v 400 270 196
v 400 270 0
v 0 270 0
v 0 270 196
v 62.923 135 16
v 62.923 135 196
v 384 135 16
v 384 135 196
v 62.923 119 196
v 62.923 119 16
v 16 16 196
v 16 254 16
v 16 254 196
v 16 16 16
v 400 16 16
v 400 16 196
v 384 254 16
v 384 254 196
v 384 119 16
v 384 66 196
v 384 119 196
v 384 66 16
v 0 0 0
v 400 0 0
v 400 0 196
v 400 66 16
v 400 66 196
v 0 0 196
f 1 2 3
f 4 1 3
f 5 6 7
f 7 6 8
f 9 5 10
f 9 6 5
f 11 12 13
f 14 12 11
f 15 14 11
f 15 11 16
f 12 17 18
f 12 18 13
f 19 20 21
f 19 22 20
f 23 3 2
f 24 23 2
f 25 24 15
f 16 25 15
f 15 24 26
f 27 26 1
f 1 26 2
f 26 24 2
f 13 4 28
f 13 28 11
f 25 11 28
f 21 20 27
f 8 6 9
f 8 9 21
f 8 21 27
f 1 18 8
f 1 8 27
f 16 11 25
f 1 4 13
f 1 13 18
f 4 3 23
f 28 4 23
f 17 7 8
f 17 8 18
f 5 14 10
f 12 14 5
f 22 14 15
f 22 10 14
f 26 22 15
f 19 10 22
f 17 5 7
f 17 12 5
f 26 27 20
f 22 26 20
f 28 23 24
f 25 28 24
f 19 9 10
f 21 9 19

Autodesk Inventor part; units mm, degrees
ref_plane "YZ Plane" through (0, 0, 0) normal (1, 0, 0) x (0, 1, 0)
ref_plane "XZ Plane" through (0, 0, 0) normal (0, 1, 0) x (-1, 0, 0)
ref_plane "XY Plane" through (0, 0, 0) normal (0, 0, 1) x (1, 0, 0)
sketch "Sketch1" plane through (0, 0, 0) normal (0, 0, 1) x (1, 0, 0)
  line L0 (0, 0) -> (400, 0)
  line L1 (400, 0) -> (400, 270)
  line L2 (400, 270) -> (0, 270)
  line L3 (0, 270) -> (0, 0)
  dimension "d0" = 400
  dimension "d1" = 270
extrude "Extrusion1" add sketch "Sketch1" along normal blind 16
sketch "Sketch2" plane through (0, 0, 16) normal (0, 0, 1) x (1, 0, 0)
  line L0 (0, 0) -> (400, 0) projected
  line L1 (400, 0) -> (400, 270) projected
  line L2 (400, 270) -> (0, 270) projected
  line L3 (0, 270) -> (0, 0) projected
  line L4 (16, 16) -> (384, 16)
  line L5 (384, 16) -> (384, 254)
  line L6 (384, 254) -> (16, 254)
  line L7 (16, 254) -> (16, 16)
  dimension "d4" = 16
  dimension "d5" = 16
  dimension "d6" = 16
  dimension "d7" = 16
extrude "Extrusion2" add sketch "Sketch2" along normal blind 180
sketch "Sketch3" plane through (0, 0, 196) normal (0, 0, 1) x (1, 0, 0)
  line L0 (16, 254) -> (16, 16) projected
  line L1 (16, 16) -> (384, 16) projected
  line L2 (384, 16) -> (384, 254) projected
  line L3 (384, 254) -> (16, 254) projected
  line L4 (384, 254) -> (384, 16) projected
  line L5 (400, 0) -> (400, 270) projected
  line L6 (384, 16) -> (400, 16)
  line L7 (400, 16) -> (400, 66)
  line L8 (400, 66) -> (384, 66)
  line L9 (384, 66) -> (384, 16)
  point P0 (0, 0)
  dimension "d10" = 50
extrude "Extrusion3" cut sketch "Sketch3" against normal blind 180 contours L2 L8 L5 L6
sketch "Sketch4" plane through (0, 0, 196) normal (0, 0, 1) x (1, 0, 0)
  line L0 (16, 254) -> (16, 16) projected
  line L1 (400, 16) -> (16, 16) projected
  line L2 (400, 66) -> (400, 16) projected
  line L3 (384, 66) -> (400, 66) projected
  line L4 (384, 66) -> (384, 254) projected
  line L5 (384, 254) -> (16, 254) projected
  line L6 (384, 66) -> (400, 66) projected
  line L7 (400, 66) -> (400, 270) projected
  line L8 (400, 270) -> (0, 270) projected
  line L9 (0, 270) -> (0, 0) projected
  line L10 (0, 0) -> (400, 0) projected
  line L11 (400, 0) -> (400, 16) projected
  line L12 (400, 16) -> (16, 16) projected
  line L13 (16, 16) -> (16, 254) projected
  line L14 (16, 254) -> (384, 254) projected
  line L15 (384, 254) -> (384, 66) projected
  line L16 (384, 254) -> (384, 66) projected
  line L17 (384, 254) -> (62.9229, 254)
  line L18 (62.9229, 254) -> (62.9229, 119)
  line L19 (62.9229, 119) -> (384, 119)
  line L20 (384, 119) -> (384, 254)
  line L21 (384, 254) -> (16, 254) projected
  line L22 (384, 254) -> (62.9229, 254)
  line L23 (62.9229, 254) -> (62.9229, 135)
  line L24 (62.9229, 135) -> (384, 135)
  line L25 (384, 135) -> (384, 254)
  dimension "d13" = 135
  dimension "d14" = 16
extrude "Extrusion4" add sketch "Sketch4" against normal blind 180 contours L24 L4 L19 L18
properties part number "box"
